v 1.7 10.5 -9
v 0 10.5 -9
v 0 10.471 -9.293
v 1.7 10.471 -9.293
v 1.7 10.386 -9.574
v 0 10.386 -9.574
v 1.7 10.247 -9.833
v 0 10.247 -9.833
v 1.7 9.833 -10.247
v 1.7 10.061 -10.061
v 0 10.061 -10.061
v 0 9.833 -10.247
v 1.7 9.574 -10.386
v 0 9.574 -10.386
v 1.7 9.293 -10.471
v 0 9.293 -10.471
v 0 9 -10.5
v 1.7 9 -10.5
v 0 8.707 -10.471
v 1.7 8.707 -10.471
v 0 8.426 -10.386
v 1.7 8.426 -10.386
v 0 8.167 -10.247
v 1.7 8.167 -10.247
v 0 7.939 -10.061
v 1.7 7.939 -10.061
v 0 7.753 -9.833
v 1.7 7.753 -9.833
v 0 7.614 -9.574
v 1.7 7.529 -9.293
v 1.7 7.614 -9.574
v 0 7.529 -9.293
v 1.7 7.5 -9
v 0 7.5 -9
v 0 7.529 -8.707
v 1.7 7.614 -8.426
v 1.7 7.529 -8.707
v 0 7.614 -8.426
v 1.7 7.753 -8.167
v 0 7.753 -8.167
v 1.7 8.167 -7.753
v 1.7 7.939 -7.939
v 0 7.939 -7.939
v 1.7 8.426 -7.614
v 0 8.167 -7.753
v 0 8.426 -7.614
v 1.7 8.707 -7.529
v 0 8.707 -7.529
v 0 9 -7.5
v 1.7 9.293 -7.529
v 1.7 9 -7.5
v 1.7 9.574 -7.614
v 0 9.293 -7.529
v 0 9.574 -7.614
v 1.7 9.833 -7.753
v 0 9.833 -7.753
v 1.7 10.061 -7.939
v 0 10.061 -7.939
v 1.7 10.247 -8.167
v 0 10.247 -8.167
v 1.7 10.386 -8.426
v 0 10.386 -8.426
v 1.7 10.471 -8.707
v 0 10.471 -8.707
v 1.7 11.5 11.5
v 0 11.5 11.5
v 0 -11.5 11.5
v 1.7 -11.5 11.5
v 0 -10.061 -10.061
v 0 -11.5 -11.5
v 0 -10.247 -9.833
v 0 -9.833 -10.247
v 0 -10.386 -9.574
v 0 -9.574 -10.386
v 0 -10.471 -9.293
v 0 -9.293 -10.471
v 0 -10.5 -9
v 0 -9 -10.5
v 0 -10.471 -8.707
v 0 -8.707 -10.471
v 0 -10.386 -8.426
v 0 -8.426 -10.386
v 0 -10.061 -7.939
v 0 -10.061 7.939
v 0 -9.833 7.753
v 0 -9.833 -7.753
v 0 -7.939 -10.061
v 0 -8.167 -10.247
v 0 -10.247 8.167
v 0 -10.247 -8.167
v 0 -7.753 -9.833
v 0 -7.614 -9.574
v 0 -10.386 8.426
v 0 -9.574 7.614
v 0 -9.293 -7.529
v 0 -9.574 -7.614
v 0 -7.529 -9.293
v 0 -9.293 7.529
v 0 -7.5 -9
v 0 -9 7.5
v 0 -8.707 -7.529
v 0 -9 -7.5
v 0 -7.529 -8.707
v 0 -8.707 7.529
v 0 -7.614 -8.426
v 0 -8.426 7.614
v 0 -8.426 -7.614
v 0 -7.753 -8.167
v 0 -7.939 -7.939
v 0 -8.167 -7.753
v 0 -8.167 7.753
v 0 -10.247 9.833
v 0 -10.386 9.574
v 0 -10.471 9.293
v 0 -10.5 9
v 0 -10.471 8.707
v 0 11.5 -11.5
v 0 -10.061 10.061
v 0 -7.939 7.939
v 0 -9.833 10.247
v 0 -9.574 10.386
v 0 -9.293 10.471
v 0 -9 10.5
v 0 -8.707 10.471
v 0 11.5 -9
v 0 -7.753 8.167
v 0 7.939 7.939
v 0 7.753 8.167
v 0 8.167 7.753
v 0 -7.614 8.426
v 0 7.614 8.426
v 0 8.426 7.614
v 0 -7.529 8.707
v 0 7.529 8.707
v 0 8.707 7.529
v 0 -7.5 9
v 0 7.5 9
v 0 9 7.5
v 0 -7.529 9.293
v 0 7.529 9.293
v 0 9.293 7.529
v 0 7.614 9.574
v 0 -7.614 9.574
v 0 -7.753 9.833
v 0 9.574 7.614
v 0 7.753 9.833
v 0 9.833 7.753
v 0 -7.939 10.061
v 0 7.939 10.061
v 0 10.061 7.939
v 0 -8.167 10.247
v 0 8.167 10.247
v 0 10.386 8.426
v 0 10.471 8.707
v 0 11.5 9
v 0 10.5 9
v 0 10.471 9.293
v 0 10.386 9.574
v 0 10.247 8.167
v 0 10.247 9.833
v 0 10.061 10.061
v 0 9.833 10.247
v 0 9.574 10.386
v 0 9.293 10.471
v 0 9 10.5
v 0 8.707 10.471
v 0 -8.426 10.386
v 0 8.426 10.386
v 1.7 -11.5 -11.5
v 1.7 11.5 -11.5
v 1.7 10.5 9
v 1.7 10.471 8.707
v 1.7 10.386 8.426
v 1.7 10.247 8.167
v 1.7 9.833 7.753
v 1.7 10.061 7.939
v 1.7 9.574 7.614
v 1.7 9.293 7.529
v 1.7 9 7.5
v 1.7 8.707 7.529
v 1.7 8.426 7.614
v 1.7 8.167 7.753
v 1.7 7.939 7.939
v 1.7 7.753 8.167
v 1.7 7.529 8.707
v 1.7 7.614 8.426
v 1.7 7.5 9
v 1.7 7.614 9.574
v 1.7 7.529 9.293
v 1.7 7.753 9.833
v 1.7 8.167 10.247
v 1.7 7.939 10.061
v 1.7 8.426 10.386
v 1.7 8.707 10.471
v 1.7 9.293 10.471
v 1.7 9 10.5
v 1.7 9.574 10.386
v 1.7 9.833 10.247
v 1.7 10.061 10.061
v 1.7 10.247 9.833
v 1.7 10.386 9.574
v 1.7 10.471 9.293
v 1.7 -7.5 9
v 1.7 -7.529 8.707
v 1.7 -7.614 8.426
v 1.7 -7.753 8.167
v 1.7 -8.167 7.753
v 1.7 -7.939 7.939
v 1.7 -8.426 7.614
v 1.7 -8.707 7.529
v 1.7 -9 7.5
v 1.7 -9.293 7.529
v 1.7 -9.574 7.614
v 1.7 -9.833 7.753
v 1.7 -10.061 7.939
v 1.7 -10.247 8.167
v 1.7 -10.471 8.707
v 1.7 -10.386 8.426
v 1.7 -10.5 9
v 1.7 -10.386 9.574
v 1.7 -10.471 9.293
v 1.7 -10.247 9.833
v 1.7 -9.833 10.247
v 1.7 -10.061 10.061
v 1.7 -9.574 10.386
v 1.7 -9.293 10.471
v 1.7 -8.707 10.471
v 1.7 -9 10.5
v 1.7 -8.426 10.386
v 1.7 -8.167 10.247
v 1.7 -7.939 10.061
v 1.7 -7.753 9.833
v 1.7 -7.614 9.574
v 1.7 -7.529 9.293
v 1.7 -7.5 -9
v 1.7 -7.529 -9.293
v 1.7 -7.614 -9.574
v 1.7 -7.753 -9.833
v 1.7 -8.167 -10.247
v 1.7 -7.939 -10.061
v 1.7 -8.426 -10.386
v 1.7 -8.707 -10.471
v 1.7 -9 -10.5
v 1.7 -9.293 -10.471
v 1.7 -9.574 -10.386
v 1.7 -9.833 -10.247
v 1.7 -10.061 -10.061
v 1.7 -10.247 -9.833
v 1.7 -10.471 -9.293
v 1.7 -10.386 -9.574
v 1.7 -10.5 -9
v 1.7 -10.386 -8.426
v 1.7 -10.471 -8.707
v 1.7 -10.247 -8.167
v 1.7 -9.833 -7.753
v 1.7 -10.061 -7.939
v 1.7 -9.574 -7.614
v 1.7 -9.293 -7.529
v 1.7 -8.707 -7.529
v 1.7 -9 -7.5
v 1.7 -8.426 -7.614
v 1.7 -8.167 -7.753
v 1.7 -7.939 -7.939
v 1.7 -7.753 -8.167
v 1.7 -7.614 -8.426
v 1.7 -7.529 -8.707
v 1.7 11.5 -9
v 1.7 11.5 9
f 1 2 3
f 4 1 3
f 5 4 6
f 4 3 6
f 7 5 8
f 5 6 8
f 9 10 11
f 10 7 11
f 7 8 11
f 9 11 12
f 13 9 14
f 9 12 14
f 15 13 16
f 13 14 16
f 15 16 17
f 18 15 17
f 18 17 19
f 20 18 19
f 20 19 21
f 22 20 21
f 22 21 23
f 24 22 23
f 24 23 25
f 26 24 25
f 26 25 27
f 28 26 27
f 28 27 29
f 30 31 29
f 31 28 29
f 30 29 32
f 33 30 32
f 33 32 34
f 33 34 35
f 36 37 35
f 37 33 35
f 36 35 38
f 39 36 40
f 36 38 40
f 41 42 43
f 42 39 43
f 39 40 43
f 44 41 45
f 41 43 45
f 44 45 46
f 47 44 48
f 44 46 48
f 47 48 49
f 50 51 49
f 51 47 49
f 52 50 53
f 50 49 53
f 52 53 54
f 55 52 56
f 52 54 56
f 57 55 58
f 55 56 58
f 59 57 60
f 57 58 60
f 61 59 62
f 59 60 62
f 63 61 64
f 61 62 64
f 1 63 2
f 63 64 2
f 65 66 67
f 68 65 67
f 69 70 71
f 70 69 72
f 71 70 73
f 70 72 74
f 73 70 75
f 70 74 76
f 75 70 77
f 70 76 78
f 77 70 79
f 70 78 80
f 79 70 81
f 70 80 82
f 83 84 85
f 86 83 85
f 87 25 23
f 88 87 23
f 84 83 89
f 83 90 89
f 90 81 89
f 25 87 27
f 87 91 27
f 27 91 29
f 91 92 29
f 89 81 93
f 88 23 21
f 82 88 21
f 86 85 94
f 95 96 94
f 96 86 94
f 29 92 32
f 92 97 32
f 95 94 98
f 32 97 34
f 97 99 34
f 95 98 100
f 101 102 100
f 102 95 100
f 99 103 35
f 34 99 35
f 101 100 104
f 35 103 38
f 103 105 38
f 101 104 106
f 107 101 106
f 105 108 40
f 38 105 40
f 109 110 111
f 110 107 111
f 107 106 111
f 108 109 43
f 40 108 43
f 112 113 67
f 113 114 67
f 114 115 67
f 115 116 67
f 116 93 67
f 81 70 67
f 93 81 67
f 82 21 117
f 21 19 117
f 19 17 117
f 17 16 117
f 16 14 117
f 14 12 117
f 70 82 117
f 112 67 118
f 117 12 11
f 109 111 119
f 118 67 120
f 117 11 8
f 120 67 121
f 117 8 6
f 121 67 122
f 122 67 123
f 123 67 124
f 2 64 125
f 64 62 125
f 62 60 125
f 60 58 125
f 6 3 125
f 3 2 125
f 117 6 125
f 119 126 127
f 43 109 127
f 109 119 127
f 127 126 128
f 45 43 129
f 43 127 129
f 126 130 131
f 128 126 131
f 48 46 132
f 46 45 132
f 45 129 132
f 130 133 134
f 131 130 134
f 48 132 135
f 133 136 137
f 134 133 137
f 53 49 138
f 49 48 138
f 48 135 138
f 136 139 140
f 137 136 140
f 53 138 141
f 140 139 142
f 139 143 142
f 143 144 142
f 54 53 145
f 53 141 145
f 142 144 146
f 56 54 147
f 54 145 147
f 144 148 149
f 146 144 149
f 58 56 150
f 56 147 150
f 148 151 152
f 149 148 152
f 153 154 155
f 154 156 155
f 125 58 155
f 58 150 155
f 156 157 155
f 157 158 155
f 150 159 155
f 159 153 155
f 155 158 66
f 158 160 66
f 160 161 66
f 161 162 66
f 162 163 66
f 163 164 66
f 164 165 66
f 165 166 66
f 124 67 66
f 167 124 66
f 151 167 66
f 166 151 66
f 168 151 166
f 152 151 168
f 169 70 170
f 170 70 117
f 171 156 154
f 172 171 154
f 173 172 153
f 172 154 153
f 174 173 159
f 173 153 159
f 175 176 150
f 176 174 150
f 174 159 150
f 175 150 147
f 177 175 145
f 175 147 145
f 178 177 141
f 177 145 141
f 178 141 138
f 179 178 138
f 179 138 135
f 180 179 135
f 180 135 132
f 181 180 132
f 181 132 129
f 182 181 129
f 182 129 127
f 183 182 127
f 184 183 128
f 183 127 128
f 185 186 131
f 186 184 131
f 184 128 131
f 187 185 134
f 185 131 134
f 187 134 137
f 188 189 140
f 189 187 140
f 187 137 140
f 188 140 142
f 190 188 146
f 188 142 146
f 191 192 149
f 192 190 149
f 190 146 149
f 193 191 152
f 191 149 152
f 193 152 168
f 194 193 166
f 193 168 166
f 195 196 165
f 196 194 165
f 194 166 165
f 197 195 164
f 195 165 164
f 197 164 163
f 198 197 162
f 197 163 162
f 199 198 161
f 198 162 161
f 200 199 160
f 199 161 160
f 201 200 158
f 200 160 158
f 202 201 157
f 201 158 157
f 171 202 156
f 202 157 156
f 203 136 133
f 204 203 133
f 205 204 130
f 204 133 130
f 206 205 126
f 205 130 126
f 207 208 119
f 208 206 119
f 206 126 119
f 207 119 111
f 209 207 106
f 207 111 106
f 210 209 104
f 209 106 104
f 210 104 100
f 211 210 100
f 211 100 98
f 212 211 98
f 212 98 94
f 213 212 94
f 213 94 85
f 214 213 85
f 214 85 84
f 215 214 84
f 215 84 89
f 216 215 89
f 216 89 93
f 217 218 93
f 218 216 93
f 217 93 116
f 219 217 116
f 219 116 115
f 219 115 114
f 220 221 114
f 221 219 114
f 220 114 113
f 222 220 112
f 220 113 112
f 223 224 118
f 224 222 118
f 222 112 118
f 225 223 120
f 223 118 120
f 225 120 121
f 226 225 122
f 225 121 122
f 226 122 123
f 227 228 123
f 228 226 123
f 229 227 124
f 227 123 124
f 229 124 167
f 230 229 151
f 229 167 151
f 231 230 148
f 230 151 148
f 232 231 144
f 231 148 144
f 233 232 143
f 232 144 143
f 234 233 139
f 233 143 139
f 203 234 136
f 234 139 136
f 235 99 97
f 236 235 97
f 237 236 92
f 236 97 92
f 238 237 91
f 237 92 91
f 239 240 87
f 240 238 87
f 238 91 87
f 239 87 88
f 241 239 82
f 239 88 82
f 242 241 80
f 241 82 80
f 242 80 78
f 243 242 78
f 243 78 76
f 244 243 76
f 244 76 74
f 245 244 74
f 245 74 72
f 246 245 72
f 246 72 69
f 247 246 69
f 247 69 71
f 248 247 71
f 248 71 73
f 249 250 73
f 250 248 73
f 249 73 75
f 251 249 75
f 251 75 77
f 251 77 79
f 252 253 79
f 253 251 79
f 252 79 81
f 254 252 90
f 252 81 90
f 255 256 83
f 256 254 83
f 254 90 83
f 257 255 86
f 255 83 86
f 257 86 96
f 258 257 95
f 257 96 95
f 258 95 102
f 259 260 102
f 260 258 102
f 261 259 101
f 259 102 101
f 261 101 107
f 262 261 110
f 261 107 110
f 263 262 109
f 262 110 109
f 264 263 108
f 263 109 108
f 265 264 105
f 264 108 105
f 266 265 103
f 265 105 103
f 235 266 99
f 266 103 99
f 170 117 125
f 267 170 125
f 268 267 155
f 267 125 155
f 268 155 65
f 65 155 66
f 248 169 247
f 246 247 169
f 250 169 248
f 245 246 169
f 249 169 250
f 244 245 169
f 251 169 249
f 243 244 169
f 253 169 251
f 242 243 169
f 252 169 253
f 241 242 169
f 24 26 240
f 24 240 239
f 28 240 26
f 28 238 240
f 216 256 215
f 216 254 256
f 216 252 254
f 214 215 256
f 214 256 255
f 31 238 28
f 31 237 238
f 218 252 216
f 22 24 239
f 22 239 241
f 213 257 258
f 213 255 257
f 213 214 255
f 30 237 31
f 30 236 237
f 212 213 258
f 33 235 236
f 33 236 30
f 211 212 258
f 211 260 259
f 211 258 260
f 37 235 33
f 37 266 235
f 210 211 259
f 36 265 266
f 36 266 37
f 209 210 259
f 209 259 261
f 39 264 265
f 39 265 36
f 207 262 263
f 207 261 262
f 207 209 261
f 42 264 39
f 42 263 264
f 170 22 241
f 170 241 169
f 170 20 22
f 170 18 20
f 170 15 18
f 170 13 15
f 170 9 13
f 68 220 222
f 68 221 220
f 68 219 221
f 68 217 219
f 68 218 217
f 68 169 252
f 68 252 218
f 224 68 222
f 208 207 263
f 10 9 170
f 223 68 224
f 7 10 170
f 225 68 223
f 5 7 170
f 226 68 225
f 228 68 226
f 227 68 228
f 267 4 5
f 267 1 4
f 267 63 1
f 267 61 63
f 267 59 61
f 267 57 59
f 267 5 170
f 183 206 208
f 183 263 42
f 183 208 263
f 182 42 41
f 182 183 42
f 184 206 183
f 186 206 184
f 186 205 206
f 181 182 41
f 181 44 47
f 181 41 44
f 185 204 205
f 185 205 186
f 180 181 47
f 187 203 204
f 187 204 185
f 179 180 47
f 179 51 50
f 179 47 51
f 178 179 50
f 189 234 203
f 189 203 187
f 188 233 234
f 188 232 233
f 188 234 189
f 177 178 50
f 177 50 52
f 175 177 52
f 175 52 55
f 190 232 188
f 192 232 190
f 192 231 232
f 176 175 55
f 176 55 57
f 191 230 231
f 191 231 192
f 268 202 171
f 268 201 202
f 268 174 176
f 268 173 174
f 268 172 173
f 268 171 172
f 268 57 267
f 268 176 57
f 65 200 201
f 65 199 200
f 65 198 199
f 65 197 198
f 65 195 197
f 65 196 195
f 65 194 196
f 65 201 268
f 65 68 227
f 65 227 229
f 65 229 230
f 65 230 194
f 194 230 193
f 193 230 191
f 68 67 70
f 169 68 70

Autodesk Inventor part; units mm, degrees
ref_plane "YZ Plane" through (0, 0, 0) normal (1, 0, 0) x (0, 1, 0)
ref_plane "XZ Plane" through (0, 0, 0) normal (0, 1, 0) x (-1, 0, 0)
ref_plane "XY Plane" through (0, 0, 0) normal (0, 0, 1) x (1, 0, 0)
sketch "Sketch1" plane through (0, 0, 0) normal (1, 0, 0) x (0, 1, 0)
  line L0 (11.5, 11.5) -> (-11.5, 11.5)
  line L1 (-11.5, 11.5) -> (-11.5, -11.5)
  line L2 (-11.5, -11.5) -> (11.5, -11.5)
  line L3 (11.5, -11.5) -> (11.5, 11.5)
  line L4 (11.5, 11.5) -> (-11.5, -11.5) construction
  line L5 (-11.5, 11.5) -> (11.5, -11.5) construction
  line L6 (11.5, 11.5) -> (11.5, 9)
  line L7 (11.5, 9) -> (9, 9)
  circle A0 centre (9, 9) radius 1.5
  line L8 (11.5, 0) -> (-11.5, 0)
  line L9 (0, 11.5) -> (0, -11.5)
  line L10 (11.5, -11.5) -> (-11.5, 11.5) construction
  line L11 (11.5, -9) -> (9, -9)
  circle A1 centre (9, -9) radius 1.5
  circle A2 centre (-9, 9) radius 1.5
  circle A3 centre (-9, -9) radius 1.5
  point P0 (0, 0)
  dimension "d0" = 23
  dimension "d1" = 23
  dimension "d2" = 2.5
  dimension "d3" = 2.5
  dimension "d4" = 3
extrude "Extrusion1" add sketch "Sketch1" along normal blind 1.7
ref_plane "Work Plane1" through (0, 0, 11.5) normal (0, 1, 0) x (1, 0, 0)
ref_plane "Work Plane2" through (0, -11.5, 0) normal (0, 0, -1) x (-1, 0, 0)
properties part number "magentic_encoder_modell"
